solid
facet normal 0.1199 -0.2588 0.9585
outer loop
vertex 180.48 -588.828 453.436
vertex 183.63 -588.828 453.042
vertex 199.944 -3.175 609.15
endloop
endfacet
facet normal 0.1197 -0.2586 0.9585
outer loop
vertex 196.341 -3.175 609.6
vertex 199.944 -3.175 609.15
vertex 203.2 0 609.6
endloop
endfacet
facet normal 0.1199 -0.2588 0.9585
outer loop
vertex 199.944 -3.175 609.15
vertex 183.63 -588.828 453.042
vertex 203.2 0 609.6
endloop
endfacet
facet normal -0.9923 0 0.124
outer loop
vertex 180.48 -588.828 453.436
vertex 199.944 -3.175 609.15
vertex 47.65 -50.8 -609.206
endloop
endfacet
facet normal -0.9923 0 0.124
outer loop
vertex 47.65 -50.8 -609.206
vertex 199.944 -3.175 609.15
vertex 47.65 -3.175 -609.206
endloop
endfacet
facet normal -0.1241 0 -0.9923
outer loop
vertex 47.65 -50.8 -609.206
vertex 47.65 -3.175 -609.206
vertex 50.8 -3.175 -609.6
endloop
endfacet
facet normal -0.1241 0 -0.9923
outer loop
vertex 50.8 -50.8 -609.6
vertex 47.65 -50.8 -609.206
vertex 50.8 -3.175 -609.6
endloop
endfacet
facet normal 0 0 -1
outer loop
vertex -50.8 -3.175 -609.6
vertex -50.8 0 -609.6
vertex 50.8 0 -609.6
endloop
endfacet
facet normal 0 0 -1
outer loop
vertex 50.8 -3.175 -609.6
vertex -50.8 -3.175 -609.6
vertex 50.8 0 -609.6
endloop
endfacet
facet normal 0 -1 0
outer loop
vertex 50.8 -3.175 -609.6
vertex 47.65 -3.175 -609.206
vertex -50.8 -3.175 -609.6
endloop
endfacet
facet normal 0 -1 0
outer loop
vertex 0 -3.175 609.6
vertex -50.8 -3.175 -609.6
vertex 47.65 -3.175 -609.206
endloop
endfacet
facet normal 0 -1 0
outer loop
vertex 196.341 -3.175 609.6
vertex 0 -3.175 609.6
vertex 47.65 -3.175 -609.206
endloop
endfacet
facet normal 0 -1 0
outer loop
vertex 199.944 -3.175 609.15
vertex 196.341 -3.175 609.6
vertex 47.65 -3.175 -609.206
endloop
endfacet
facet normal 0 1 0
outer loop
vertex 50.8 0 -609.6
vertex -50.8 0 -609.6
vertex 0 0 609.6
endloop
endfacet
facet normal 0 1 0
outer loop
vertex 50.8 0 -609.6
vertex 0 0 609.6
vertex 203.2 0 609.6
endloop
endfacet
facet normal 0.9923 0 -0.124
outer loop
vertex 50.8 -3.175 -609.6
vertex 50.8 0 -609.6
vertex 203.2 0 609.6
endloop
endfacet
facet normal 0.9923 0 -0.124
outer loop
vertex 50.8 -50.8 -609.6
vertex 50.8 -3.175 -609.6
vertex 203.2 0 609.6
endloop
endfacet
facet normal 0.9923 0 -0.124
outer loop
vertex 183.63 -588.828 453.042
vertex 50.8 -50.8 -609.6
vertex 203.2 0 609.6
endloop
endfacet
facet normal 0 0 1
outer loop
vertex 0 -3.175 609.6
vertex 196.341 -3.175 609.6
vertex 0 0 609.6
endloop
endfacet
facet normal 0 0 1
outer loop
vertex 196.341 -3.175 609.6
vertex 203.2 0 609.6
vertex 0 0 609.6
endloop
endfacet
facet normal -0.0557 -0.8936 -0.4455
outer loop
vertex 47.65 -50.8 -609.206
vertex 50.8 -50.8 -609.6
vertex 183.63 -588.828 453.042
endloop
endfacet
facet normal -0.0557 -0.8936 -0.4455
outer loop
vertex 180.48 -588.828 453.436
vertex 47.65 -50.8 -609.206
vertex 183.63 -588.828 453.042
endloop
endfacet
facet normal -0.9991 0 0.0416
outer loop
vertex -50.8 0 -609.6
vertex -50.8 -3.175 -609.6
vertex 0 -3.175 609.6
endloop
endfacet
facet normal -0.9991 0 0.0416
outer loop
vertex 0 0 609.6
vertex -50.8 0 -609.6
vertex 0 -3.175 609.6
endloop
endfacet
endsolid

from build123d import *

# Parameters (mm, degrees)
F1_DEPTH = 3.175
F3_DEPTH = 609.6
F5_DEPTH = 1211.58
F7_DEPTH = 25.4


with BuildPart() as f1:
    # F0 (on Front) → F1 (new body)
    with BuildSketch(Plane.XZ):
        Polygon((50.8, -609.6), (203.2, 609.6), (0, 609.6), (0, -609.6), align=None)
        Polygon((0, -609.6), (0, 609.6), (-203.2, 609.6), (-50.8, -609.6), align=None)
    extrude(amount=F1_DEPTH)

    # F2 (on face) → F3 (join)
    with BuildSketch(Plane.XZ.offset(3.175)):
        Polygon((47.6495177414, -609.2061897177), (50.8, -609.6), (203.2, 609.6), (200.0002914561, 609.6), align=None)
    extrude(amount=F3_DEPTH)

    # F4 (on face) → F5 (cut)
    with BuildSketch(Plane(origin=(125.0461538462, 0, -15.6307692308), x_dir=(0, 1, 0), z_dir=(0.9922778767, 0, -0.1240347346))):
        Polygon((-588.8283837058, 472.3203618187), (0, 630.0964517132), (0, 731.3741445541), (-712.4527692795, 731.3741445541), (-712.4527692795, -900.0895023346), (-50.8, -900.0895023346), (-50.8, -598.5916291275), align=None)
    extrude(amount=-F5_DEPTH, mode=Mode.SUBTRACT)

    # F6 (on face) → F7 (cut)
    with BuildSketch(Plane.XZ.offset(3.175)):
        Polygon((-203.2, 609.6), (-50.8, -609.6), (0, 609.6), align=None)
    extrude(amount=-F7_DEPTH, mode=Mode.SUBTRACT)


solid = f1.part
